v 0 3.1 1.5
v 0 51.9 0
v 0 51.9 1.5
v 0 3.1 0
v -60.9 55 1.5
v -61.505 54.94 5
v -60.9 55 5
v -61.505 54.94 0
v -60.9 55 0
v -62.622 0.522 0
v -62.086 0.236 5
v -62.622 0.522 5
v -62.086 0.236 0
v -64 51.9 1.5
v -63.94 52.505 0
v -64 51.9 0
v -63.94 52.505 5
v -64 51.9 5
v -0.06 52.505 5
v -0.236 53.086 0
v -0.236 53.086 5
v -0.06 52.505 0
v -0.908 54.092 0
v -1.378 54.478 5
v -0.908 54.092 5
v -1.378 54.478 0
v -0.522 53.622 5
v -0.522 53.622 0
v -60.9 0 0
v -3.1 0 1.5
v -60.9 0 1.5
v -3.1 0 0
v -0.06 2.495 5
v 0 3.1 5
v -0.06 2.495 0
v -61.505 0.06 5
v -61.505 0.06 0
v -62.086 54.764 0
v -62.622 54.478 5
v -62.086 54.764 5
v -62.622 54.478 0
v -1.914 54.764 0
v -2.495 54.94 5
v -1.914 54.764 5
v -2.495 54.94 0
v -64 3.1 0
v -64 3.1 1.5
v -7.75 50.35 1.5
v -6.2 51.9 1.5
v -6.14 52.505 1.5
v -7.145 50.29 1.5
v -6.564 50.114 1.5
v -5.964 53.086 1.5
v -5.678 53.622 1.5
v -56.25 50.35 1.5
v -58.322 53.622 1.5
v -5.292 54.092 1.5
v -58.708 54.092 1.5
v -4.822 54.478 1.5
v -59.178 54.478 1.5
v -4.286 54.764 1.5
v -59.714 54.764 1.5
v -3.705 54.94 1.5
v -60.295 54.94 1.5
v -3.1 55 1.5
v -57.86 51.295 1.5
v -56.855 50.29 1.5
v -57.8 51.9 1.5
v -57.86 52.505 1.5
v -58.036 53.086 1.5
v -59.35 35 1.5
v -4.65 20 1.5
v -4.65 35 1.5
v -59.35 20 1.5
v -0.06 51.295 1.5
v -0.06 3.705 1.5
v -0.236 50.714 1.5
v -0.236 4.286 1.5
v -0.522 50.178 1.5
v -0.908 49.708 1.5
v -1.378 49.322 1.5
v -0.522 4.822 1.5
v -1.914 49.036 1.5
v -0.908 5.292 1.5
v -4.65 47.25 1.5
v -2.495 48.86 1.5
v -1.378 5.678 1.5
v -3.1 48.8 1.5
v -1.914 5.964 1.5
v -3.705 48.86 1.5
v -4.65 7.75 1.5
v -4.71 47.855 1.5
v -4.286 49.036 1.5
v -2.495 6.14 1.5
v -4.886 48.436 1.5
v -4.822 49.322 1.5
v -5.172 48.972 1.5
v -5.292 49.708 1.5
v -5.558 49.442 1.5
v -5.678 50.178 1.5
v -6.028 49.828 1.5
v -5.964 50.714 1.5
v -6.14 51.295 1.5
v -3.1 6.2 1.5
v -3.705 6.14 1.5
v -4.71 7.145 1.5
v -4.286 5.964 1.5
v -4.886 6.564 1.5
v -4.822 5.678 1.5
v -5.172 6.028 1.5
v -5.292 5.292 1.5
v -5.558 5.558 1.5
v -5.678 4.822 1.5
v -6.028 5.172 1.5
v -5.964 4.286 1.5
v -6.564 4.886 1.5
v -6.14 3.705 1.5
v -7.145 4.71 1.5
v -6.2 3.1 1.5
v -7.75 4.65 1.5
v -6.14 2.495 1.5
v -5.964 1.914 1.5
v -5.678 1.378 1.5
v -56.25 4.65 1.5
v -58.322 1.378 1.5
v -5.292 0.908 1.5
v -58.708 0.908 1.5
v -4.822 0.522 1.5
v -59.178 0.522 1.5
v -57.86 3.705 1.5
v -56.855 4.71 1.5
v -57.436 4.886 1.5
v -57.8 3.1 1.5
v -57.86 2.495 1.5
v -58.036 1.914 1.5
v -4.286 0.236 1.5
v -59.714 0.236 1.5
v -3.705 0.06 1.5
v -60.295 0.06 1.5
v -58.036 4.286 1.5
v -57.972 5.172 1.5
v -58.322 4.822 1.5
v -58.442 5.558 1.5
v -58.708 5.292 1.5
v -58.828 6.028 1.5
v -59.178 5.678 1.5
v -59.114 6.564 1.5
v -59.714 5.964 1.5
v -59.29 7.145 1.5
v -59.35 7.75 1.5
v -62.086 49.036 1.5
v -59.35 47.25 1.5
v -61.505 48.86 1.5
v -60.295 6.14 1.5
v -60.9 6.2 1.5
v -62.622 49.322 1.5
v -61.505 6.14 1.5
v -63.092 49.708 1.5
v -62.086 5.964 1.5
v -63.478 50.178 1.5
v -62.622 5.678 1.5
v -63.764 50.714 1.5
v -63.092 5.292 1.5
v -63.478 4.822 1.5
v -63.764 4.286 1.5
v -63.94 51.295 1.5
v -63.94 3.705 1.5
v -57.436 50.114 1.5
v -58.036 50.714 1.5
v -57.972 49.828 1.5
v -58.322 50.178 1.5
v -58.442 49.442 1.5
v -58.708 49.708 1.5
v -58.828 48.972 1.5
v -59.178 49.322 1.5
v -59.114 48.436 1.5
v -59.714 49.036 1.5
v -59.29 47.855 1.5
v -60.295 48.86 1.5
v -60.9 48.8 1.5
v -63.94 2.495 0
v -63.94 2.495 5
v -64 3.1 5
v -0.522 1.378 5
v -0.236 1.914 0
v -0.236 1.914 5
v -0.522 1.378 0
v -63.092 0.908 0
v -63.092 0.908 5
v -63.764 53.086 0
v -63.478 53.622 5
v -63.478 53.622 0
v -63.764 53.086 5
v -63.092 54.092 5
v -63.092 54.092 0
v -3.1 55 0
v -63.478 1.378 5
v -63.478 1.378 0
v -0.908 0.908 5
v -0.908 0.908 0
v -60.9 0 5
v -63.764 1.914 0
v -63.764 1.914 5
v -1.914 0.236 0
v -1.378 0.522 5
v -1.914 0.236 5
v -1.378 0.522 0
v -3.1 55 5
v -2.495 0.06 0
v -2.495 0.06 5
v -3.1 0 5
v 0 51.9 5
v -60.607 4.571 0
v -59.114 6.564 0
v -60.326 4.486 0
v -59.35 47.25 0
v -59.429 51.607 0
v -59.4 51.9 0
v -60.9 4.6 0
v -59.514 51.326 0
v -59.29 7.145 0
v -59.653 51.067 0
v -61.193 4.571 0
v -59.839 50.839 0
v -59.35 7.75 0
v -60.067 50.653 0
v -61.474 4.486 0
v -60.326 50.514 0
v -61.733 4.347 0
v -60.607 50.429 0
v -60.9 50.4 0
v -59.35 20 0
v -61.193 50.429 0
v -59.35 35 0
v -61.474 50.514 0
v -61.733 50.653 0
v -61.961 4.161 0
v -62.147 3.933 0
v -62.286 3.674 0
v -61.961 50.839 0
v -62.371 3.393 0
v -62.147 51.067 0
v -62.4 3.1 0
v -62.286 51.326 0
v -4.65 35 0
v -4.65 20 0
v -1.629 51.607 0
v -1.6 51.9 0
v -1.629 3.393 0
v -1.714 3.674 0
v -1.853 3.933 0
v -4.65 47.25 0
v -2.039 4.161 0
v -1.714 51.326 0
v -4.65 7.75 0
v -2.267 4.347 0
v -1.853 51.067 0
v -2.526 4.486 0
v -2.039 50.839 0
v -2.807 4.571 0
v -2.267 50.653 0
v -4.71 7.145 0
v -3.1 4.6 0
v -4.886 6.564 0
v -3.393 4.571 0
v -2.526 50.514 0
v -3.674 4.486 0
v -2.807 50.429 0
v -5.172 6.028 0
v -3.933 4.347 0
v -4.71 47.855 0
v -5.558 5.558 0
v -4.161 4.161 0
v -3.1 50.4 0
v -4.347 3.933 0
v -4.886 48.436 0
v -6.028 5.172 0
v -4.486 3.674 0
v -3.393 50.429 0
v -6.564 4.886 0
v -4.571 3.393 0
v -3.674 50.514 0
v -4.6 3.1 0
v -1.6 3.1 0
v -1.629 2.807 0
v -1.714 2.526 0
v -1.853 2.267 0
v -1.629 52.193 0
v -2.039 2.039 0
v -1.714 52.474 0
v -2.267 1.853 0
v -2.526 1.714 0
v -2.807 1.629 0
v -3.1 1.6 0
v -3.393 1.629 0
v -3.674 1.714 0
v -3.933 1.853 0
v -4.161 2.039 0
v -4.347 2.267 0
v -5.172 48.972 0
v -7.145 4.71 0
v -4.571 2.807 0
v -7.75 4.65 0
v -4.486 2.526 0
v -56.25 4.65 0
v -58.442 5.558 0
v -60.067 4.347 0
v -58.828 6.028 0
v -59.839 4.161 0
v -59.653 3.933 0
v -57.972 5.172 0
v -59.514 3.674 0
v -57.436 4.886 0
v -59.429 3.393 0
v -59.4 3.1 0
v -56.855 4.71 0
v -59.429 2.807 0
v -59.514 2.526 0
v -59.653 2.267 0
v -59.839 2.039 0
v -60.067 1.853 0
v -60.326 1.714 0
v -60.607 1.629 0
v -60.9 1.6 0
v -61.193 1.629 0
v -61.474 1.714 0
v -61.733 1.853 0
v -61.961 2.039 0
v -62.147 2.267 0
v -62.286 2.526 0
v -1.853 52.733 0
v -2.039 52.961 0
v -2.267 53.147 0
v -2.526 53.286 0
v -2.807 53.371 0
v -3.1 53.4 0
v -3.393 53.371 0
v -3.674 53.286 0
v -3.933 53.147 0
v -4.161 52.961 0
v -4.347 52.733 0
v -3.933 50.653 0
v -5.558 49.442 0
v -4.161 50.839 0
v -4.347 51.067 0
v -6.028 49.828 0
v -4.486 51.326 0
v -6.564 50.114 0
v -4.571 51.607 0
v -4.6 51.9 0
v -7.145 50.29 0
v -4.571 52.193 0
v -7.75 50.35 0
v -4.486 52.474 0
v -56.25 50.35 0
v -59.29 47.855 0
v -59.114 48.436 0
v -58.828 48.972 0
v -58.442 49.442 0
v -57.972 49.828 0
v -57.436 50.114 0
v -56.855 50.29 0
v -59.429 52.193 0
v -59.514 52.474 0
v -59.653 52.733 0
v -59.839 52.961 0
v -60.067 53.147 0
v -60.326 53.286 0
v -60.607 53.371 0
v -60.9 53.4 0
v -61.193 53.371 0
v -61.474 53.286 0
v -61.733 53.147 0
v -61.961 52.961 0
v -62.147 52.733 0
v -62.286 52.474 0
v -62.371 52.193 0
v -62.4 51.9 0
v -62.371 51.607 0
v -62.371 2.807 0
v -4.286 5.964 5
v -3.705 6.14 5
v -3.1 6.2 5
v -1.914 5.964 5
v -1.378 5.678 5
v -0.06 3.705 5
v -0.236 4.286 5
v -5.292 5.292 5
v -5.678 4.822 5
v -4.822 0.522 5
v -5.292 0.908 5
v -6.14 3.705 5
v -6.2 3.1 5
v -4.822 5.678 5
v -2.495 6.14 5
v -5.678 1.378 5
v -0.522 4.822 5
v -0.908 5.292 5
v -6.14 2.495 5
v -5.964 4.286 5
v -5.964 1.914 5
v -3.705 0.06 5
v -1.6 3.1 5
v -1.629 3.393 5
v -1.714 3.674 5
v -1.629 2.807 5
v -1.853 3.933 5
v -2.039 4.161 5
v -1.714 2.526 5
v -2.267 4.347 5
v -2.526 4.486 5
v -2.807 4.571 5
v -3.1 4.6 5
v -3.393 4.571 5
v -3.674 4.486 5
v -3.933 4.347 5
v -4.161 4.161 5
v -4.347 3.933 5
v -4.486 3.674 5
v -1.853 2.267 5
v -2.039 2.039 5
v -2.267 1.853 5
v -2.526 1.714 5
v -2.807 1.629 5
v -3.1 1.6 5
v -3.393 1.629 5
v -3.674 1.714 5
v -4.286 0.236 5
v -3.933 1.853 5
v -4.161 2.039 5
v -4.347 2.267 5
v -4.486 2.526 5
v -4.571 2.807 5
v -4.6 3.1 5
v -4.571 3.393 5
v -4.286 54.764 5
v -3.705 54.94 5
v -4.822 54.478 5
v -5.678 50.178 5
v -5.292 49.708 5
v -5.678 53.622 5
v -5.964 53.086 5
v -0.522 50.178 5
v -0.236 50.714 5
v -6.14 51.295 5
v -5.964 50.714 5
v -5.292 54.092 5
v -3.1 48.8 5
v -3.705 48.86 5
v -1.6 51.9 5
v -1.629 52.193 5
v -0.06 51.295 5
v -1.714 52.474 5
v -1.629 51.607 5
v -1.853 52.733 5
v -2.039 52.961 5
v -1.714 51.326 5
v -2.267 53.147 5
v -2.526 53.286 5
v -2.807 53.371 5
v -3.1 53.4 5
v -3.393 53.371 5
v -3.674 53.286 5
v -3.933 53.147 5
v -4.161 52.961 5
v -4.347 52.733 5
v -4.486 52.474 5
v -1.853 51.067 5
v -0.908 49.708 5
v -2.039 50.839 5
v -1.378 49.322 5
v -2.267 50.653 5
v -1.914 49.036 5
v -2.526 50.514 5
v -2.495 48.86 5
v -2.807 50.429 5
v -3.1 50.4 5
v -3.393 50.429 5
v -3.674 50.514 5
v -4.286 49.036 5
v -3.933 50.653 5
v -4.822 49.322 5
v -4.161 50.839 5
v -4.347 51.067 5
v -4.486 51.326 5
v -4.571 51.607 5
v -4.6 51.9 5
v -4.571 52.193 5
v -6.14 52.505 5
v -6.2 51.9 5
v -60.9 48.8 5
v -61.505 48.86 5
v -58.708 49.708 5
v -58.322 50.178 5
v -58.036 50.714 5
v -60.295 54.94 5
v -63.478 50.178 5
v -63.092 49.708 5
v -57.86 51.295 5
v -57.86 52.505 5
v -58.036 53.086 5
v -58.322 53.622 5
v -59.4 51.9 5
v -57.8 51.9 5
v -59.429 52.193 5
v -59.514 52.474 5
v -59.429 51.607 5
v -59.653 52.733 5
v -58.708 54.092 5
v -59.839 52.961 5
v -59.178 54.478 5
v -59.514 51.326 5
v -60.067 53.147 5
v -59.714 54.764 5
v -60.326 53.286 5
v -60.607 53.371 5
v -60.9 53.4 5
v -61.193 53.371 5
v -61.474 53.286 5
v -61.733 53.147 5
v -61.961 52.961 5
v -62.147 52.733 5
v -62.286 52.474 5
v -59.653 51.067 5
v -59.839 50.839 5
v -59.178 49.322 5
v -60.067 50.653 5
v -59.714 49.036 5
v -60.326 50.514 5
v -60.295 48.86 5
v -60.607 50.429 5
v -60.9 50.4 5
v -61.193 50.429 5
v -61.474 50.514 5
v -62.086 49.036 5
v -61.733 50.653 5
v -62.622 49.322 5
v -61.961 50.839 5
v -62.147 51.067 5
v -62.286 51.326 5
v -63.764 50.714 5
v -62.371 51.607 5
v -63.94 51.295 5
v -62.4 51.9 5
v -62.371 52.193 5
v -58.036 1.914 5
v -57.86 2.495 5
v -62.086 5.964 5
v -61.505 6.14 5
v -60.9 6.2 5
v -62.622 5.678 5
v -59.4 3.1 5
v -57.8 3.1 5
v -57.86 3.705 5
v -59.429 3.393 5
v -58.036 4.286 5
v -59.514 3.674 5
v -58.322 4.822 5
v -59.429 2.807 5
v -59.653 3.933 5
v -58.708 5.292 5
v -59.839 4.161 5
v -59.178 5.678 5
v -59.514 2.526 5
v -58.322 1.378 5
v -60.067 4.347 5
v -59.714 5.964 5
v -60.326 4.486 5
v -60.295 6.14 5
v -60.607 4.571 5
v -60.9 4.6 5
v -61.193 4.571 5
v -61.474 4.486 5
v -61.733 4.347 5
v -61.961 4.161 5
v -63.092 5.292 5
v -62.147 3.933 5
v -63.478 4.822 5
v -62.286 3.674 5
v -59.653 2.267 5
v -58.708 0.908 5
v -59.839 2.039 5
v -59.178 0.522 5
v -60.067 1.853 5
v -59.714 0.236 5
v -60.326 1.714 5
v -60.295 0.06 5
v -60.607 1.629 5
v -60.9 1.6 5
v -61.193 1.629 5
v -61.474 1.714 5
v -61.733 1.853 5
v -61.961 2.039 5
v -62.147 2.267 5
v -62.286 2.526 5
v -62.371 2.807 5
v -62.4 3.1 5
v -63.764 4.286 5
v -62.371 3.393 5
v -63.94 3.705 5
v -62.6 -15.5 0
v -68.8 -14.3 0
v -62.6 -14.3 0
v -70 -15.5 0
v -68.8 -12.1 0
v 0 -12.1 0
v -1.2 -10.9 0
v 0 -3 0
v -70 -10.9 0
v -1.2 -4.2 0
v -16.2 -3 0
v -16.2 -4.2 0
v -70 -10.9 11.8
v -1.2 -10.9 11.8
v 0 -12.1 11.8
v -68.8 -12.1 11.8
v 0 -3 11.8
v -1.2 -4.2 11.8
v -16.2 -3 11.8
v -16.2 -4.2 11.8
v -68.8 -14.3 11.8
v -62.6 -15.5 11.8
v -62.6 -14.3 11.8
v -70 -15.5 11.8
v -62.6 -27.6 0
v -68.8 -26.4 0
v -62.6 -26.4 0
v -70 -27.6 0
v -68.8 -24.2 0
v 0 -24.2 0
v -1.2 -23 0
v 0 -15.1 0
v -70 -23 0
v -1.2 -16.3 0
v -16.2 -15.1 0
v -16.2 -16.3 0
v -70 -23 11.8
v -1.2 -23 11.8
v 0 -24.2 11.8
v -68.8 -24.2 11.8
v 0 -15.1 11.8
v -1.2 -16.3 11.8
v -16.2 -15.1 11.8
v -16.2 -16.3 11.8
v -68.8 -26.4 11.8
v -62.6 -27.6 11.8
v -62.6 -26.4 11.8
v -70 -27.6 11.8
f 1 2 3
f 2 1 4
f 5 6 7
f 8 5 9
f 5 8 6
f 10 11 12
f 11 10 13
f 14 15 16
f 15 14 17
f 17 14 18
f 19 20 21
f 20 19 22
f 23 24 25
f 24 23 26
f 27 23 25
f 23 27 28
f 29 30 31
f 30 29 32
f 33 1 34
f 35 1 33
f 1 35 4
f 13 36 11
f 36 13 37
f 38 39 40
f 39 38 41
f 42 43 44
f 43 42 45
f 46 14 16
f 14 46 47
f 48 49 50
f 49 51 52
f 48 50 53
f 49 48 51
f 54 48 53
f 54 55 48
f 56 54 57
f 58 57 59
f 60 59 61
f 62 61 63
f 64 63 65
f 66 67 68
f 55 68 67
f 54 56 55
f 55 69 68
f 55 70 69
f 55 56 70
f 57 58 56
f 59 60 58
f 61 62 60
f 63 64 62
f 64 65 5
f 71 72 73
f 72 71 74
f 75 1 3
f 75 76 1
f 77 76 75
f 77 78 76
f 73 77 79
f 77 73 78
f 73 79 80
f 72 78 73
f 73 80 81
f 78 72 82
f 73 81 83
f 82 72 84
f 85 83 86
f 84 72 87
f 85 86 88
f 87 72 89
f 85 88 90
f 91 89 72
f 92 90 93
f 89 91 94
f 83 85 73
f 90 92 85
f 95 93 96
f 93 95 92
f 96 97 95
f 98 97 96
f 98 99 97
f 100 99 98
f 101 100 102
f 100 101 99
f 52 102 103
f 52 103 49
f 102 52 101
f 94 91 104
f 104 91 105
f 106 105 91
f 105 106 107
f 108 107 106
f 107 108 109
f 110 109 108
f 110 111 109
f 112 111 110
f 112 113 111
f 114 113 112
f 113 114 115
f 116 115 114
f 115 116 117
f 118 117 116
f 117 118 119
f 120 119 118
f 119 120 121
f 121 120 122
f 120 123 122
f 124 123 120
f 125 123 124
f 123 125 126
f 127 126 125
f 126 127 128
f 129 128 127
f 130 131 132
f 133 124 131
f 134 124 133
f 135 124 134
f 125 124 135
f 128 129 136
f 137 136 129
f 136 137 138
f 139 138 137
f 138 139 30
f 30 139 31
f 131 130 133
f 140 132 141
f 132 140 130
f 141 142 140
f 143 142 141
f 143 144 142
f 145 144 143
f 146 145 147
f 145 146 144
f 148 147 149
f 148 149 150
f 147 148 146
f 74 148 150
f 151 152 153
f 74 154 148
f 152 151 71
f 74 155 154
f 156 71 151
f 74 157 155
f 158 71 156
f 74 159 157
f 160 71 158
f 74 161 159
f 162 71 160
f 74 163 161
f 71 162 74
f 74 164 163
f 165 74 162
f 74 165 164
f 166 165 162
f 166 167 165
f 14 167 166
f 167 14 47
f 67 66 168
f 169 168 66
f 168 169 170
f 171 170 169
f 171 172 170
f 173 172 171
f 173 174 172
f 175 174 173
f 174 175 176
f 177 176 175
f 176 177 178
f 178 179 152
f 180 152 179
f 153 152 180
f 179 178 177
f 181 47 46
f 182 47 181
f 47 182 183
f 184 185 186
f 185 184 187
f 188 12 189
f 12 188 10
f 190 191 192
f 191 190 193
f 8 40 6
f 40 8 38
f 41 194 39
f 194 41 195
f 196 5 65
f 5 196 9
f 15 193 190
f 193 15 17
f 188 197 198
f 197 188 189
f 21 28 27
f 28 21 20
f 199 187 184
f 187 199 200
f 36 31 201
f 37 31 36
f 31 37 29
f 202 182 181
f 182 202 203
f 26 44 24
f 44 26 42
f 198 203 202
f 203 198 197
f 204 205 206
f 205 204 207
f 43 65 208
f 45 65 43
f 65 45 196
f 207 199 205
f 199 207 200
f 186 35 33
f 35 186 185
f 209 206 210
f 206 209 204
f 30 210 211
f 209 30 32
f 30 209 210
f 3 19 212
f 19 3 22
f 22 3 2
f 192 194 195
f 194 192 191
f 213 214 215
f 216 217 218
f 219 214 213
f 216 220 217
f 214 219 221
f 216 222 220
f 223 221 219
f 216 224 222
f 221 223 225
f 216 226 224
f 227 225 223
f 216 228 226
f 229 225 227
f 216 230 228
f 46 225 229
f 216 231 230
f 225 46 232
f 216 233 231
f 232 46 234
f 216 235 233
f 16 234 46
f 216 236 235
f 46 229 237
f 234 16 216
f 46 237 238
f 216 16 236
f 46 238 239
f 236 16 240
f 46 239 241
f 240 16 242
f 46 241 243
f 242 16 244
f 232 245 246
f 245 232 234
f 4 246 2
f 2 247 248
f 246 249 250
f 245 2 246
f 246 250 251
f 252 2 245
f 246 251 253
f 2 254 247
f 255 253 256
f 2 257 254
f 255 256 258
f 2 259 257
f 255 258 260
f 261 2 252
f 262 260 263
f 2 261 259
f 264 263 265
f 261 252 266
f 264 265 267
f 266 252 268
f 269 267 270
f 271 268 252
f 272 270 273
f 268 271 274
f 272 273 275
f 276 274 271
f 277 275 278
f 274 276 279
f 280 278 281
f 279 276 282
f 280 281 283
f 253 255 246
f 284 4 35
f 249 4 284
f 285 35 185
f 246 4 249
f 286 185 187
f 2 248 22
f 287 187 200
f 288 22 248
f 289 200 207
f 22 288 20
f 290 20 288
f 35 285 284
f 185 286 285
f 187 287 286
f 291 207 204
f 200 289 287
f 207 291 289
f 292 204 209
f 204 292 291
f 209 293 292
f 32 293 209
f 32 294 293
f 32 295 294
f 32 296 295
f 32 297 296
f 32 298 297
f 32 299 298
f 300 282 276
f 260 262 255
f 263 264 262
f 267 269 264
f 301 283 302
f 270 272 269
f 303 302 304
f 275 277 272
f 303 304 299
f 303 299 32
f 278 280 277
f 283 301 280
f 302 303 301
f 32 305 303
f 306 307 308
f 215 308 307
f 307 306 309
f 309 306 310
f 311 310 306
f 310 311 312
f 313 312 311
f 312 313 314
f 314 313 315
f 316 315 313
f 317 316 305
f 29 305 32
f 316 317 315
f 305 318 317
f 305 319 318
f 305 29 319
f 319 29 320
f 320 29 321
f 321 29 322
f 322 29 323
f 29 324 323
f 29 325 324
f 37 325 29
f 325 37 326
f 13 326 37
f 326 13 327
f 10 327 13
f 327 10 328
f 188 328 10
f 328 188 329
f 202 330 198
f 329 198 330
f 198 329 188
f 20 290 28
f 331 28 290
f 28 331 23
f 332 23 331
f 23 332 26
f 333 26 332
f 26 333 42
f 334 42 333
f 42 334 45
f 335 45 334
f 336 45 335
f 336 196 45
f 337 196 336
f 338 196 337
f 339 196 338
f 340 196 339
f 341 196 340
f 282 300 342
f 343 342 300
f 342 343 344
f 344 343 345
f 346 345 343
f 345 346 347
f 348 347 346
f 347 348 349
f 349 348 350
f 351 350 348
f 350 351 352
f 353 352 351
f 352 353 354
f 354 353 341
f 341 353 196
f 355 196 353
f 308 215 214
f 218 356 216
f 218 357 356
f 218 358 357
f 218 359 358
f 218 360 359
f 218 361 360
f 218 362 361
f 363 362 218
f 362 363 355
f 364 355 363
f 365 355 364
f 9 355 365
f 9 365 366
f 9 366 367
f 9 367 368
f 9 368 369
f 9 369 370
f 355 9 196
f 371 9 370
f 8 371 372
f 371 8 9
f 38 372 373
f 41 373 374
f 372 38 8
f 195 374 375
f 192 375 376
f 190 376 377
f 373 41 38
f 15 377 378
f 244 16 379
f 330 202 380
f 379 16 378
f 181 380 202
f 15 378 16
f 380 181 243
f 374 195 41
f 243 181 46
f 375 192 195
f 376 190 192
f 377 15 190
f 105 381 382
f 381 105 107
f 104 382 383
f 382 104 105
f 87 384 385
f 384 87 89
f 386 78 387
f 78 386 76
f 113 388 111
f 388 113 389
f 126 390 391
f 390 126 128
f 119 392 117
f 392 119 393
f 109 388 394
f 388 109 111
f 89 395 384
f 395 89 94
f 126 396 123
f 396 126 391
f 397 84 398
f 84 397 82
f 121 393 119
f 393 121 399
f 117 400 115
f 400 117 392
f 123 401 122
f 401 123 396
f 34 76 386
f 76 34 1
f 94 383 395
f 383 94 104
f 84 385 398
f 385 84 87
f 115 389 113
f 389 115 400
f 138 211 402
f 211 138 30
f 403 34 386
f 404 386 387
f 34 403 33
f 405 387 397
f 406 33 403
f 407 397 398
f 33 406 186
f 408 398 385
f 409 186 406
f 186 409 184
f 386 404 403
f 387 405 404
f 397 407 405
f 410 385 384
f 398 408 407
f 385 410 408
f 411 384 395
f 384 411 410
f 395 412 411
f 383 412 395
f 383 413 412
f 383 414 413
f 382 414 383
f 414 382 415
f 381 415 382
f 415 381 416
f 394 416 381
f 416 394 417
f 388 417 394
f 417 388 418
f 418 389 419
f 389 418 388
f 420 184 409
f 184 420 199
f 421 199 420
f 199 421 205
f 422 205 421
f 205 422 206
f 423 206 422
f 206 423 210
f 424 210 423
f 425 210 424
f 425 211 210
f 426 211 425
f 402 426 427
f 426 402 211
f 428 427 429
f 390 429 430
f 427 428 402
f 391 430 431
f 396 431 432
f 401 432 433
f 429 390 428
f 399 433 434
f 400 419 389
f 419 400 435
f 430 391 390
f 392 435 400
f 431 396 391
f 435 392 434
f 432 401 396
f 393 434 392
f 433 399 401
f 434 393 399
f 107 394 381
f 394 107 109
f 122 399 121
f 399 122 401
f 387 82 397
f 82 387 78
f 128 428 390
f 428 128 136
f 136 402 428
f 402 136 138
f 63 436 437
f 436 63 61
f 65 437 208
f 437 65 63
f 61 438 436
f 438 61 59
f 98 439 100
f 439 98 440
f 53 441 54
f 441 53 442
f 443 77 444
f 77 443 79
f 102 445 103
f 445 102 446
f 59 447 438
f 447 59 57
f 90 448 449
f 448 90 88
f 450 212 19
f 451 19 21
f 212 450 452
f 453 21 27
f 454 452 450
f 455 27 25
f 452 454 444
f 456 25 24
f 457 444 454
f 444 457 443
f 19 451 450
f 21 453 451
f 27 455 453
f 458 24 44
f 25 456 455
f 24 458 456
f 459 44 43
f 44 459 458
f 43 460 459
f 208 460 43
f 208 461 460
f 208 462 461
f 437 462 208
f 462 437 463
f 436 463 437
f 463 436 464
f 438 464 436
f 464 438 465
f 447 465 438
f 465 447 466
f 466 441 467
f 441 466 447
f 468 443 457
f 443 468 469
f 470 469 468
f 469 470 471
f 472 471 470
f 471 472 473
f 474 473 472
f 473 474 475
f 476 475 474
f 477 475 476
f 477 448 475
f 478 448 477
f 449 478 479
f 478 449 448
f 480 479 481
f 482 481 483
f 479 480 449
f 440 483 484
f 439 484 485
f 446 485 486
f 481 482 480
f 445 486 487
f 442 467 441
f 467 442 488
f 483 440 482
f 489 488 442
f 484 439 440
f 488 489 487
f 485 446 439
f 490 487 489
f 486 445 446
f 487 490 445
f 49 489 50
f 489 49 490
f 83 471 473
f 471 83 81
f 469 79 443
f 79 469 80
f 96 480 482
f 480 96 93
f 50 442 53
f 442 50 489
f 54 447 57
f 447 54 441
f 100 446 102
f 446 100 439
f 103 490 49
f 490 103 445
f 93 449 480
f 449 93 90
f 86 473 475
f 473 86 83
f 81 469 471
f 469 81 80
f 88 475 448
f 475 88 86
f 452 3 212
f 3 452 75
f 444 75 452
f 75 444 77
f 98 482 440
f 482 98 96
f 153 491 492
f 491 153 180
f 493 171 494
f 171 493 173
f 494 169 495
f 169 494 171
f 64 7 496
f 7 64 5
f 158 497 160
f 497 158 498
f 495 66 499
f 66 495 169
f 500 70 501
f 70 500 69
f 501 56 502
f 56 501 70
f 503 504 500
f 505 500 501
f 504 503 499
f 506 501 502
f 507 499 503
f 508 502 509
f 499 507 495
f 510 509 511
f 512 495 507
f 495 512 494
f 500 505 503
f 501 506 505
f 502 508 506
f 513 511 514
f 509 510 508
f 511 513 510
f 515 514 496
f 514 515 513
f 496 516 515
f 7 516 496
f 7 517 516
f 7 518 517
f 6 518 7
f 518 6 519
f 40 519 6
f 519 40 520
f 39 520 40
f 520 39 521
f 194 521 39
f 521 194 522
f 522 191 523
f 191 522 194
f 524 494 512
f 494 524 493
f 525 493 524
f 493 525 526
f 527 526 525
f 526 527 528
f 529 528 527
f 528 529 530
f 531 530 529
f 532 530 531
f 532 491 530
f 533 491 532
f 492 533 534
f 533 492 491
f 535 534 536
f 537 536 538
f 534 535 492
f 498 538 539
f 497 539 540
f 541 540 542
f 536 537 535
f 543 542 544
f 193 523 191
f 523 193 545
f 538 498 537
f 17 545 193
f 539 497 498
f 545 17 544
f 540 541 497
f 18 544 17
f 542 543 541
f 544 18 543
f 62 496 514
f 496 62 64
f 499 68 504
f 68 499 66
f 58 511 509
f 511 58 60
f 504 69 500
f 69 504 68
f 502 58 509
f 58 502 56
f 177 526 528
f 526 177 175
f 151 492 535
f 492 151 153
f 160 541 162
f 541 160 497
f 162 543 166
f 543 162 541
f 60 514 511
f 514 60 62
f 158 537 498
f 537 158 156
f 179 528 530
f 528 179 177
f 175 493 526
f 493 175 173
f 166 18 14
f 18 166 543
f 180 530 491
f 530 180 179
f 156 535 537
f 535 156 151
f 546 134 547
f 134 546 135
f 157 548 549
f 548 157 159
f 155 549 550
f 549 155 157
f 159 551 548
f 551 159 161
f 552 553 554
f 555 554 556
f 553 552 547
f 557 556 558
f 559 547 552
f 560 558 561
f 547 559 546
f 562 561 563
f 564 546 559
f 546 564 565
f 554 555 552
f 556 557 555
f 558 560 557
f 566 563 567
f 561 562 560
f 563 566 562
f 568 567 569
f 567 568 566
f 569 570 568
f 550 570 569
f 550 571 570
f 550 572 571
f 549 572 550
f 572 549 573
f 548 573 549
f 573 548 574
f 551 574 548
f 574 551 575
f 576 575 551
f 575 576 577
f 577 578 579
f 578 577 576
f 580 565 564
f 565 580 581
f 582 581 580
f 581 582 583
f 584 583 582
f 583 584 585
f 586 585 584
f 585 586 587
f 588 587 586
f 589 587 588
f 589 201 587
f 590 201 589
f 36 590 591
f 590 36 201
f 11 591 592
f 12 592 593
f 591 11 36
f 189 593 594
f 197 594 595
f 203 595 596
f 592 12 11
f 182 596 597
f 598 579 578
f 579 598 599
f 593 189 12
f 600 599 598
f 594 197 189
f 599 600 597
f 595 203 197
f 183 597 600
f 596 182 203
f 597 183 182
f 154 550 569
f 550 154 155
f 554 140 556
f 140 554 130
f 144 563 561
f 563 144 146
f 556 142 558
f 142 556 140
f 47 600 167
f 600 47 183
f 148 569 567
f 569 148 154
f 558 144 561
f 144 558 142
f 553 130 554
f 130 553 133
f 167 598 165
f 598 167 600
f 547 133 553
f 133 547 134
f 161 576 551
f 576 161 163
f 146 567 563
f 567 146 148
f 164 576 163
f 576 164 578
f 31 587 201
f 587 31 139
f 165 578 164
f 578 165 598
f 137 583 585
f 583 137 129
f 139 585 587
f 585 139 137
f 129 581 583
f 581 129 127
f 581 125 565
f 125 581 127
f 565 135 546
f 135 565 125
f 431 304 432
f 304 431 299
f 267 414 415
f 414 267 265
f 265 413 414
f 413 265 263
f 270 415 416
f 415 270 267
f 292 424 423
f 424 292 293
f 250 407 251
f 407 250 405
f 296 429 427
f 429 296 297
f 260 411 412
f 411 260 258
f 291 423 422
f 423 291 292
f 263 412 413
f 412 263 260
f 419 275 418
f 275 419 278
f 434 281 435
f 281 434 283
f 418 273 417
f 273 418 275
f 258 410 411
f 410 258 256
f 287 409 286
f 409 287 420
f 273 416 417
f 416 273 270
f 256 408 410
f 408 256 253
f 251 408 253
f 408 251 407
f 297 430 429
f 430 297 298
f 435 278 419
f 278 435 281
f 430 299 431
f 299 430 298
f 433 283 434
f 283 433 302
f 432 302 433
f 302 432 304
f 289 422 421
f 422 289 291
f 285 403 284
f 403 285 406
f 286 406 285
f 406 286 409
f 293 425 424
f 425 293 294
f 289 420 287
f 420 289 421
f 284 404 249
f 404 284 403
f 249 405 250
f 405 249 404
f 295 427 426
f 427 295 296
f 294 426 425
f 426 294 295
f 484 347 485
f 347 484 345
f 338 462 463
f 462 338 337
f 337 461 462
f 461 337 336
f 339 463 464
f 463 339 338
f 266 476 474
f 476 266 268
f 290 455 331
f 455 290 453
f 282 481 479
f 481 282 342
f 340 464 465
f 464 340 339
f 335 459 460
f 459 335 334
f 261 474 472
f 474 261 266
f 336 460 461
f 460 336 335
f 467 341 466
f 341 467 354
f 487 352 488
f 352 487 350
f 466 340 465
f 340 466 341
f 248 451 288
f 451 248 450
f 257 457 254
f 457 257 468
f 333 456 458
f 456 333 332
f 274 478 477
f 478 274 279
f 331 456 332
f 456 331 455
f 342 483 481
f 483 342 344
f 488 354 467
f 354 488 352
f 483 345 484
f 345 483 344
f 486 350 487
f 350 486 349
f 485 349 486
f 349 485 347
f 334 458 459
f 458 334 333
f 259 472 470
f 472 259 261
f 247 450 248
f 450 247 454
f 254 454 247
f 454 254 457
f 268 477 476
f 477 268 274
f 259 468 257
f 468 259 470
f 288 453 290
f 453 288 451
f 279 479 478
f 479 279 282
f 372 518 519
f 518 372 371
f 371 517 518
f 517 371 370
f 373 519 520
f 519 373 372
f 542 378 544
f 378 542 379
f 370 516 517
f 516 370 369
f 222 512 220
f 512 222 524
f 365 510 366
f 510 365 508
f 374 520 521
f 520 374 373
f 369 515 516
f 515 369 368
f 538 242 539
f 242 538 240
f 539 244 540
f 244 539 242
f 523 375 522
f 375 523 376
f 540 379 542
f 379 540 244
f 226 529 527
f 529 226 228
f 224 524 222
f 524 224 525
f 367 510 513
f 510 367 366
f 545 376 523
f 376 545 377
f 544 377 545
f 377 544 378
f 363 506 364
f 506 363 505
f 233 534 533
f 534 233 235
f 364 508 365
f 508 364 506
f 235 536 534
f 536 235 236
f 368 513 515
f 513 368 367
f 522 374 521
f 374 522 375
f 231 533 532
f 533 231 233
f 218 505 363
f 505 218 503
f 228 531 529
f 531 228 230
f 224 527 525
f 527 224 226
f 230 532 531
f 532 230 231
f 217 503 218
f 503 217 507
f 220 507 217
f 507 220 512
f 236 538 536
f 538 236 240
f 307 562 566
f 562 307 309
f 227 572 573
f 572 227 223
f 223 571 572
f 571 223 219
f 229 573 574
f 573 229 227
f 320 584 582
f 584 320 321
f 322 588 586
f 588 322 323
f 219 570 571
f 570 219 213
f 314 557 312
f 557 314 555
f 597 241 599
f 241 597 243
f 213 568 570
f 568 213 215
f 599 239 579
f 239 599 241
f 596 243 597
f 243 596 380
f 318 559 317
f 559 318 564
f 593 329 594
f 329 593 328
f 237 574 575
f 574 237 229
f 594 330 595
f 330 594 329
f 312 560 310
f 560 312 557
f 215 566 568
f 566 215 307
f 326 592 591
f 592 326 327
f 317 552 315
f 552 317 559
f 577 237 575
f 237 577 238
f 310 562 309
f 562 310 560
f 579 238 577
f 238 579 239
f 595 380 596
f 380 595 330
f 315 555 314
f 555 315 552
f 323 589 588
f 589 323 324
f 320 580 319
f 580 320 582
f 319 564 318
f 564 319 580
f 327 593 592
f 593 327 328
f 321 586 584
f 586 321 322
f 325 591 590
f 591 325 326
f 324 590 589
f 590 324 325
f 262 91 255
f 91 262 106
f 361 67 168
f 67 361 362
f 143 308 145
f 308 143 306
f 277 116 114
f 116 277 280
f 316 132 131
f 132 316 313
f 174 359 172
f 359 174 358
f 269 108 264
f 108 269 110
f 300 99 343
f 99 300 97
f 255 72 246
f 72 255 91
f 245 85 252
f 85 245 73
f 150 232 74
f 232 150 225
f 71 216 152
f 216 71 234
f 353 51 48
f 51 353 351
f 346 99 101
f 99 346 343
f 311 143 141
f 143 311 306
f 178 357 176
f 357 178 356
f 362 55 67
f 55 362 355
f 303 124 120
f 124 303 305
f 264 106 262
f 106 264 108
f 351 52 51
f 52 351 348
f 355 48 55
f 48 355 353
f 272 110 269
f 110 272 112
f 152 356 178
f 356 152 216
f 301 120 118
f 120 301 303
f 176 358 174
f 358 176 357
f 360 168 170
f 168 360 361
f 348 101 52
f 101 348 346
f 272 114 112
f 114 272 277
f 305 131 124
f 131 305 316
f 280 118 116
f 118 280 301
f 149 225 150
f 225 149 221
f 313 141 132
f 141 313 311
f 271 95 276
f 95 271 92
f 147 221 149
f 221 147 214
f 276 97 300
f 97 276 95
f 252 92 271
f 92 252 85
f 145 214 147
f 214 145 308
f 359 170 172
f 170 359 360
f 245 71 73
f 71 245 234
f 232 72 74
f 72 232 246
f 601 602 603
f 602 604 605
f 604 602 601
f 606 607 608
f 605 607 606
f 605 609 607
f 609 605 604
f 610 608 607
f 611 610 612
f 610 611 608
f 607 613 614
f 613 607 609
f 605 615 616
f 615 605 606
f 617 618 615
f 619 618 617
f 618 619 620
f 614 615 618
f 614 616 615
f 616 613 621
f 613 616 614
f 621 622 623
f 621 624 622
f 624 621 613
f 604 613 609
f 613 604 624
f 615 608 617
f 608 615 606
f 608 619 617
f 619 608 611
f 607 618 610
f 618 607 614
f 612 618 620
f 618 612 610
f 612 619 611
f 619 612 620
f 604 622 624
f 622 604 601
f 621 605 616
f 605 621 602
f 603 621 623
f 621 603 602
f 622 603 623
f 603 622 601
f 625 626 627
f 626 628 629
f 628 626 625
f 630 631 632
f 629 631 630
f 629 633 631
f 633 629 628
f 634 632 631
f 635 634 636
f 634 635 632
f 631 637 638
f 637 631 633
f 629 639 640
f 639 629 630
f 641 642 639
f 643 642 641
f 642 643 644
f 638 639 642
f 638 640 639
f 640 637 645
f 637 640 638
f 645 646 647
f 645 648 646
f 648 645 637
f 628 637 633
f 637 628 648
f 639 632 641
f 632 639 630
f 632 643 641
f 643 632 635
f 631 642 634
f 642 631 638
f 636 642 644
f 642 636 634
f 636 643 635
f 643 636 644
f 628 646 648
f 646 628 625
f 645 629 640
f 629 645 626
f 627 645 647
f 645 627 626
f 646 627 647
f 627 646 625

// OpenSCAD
// rpi mount
width = 55;
length = 64;
height = 1.5;
height_spacer = 5;
id = 3;
od = 6.2;
middle = 15;

ir=id/2.0;
or=od/2.0;
$fn = 32;

// clamp
clamp_clearance = 0.7;
clamp_width = (width - 2 * od - middle) / 2 - 2;
clamp_length = 70;
clamp_side_a = 6 + clamp_clearance;
clamp_hook_a = 15;
clamp_side_b = height + clamp_clearance;
clamp_hook_b = od;
clamp_height = 1.2;

module spacer(h) {
    difference() {
        cylinder(r=or, h=h);
        translate([0,0,-0.1]) cylinder(r=ir, h=h+0.2);
    }
}

module plate() {
    inner_width = width - 1.5*od;
    inner_length = length - 1.5*od;

    translate([-or, or, 0])
    rotate([0,0,90])
    union() {
        difference() {
            union() {
                hull() {
                    cylinder(r=or, h=height);
                    translate([width - 2*or, 0, 0]) cylinder(r=or, h=height);
                    translate([width - 2*or, length - 2*or, 0]) cylinder(r=or, h=height);
                    translate([0, length - 2*or, 0]) cylinder(r=or, h=height);
                }

                // spacer
                cylinder(r=or, h=height_spacer);
                translate([width - 2*or, 0, 0]) cylinder(r=or, h=height_spacer);
                translate([width - 2*or, length - 2*or, 0]) cylinder(r=or, h=height_spacer);
                translate([0, length - 2*or, 0]) cylinder(r=or, h=height_spacer);
            }

            // holes
            translate([0, 0, -0.1]) cylinder(r=ir, h=height_spacer+0.2);
            translate([width - 2*or, 0, -0.1]) cylinder(r=ir, h=height_spacer+0.2);
            translate([width - 2*or, length - 2*or, -0.1]) cylinder(r=ir, h=height_spacer+0.2);
            translate([0, length - 2*or, -0.1]) cylinder(r=ir, h=height_spacer+0.2);

            // space
            translate([1.5*or, 1.5*or, -0.1]) {
                hull() {
                    cylinder(r=or, h=height+0.2);
                    translate([inner_width - 2*or, 0, 0]) cylinder(r=or, h=height+0.2);
                    translate([inner_width - 2*or, inner_length - 2*or, 0]) cylinder(r=or, h=height+0.2);
                    translate([0, inner_length - 2*or, 0]) cylinder(r=or, h=height+0.2);
                }
            }
        }

        translate([(width / 2 - or) - middle / 2, 0, 0]) cube([middle, length - or, height]);
    }
}

module clamp() {
    translate([0,0,clamp_width])
    rotate([0,90,90])
    union() {
        cube([clamp_width, clamp_length, clamp_height]);

        // hook side a
        cube([clamp_width, clamp_height, clamp_side_a + 2*clamp_height]);
        translate([0, 0, clamp_side_a + clamp_height]) cube([clamp_width, clamp_hook_a + clamp_height, clamp_height]);

        // hook side b
        translate([0, clamp_length - clamp_height, - clamp_side_b - clamp_height]) cube([clamp_width, clamp_height, clamp_side_b + 2*clamp_height]);
        translate([0, clamp_length - clamp_height - clamp_hook_b, - clamp_side_b - clamp_height]) cube([clamp_width, clamp_hook_b + clamp_height, clamp_height]);
    }

}

module two_clamps() {
    y_shift = - clamp_side_a - 2 * clamp_height - 3;
    translate([0,y_shift,0]) clamp();
    translate([0,2*y_shift,0]) clamp();
}

// to fit on 10x10 print bed, build only plate
// or two_clamps a time

plate();
two_clamps();
